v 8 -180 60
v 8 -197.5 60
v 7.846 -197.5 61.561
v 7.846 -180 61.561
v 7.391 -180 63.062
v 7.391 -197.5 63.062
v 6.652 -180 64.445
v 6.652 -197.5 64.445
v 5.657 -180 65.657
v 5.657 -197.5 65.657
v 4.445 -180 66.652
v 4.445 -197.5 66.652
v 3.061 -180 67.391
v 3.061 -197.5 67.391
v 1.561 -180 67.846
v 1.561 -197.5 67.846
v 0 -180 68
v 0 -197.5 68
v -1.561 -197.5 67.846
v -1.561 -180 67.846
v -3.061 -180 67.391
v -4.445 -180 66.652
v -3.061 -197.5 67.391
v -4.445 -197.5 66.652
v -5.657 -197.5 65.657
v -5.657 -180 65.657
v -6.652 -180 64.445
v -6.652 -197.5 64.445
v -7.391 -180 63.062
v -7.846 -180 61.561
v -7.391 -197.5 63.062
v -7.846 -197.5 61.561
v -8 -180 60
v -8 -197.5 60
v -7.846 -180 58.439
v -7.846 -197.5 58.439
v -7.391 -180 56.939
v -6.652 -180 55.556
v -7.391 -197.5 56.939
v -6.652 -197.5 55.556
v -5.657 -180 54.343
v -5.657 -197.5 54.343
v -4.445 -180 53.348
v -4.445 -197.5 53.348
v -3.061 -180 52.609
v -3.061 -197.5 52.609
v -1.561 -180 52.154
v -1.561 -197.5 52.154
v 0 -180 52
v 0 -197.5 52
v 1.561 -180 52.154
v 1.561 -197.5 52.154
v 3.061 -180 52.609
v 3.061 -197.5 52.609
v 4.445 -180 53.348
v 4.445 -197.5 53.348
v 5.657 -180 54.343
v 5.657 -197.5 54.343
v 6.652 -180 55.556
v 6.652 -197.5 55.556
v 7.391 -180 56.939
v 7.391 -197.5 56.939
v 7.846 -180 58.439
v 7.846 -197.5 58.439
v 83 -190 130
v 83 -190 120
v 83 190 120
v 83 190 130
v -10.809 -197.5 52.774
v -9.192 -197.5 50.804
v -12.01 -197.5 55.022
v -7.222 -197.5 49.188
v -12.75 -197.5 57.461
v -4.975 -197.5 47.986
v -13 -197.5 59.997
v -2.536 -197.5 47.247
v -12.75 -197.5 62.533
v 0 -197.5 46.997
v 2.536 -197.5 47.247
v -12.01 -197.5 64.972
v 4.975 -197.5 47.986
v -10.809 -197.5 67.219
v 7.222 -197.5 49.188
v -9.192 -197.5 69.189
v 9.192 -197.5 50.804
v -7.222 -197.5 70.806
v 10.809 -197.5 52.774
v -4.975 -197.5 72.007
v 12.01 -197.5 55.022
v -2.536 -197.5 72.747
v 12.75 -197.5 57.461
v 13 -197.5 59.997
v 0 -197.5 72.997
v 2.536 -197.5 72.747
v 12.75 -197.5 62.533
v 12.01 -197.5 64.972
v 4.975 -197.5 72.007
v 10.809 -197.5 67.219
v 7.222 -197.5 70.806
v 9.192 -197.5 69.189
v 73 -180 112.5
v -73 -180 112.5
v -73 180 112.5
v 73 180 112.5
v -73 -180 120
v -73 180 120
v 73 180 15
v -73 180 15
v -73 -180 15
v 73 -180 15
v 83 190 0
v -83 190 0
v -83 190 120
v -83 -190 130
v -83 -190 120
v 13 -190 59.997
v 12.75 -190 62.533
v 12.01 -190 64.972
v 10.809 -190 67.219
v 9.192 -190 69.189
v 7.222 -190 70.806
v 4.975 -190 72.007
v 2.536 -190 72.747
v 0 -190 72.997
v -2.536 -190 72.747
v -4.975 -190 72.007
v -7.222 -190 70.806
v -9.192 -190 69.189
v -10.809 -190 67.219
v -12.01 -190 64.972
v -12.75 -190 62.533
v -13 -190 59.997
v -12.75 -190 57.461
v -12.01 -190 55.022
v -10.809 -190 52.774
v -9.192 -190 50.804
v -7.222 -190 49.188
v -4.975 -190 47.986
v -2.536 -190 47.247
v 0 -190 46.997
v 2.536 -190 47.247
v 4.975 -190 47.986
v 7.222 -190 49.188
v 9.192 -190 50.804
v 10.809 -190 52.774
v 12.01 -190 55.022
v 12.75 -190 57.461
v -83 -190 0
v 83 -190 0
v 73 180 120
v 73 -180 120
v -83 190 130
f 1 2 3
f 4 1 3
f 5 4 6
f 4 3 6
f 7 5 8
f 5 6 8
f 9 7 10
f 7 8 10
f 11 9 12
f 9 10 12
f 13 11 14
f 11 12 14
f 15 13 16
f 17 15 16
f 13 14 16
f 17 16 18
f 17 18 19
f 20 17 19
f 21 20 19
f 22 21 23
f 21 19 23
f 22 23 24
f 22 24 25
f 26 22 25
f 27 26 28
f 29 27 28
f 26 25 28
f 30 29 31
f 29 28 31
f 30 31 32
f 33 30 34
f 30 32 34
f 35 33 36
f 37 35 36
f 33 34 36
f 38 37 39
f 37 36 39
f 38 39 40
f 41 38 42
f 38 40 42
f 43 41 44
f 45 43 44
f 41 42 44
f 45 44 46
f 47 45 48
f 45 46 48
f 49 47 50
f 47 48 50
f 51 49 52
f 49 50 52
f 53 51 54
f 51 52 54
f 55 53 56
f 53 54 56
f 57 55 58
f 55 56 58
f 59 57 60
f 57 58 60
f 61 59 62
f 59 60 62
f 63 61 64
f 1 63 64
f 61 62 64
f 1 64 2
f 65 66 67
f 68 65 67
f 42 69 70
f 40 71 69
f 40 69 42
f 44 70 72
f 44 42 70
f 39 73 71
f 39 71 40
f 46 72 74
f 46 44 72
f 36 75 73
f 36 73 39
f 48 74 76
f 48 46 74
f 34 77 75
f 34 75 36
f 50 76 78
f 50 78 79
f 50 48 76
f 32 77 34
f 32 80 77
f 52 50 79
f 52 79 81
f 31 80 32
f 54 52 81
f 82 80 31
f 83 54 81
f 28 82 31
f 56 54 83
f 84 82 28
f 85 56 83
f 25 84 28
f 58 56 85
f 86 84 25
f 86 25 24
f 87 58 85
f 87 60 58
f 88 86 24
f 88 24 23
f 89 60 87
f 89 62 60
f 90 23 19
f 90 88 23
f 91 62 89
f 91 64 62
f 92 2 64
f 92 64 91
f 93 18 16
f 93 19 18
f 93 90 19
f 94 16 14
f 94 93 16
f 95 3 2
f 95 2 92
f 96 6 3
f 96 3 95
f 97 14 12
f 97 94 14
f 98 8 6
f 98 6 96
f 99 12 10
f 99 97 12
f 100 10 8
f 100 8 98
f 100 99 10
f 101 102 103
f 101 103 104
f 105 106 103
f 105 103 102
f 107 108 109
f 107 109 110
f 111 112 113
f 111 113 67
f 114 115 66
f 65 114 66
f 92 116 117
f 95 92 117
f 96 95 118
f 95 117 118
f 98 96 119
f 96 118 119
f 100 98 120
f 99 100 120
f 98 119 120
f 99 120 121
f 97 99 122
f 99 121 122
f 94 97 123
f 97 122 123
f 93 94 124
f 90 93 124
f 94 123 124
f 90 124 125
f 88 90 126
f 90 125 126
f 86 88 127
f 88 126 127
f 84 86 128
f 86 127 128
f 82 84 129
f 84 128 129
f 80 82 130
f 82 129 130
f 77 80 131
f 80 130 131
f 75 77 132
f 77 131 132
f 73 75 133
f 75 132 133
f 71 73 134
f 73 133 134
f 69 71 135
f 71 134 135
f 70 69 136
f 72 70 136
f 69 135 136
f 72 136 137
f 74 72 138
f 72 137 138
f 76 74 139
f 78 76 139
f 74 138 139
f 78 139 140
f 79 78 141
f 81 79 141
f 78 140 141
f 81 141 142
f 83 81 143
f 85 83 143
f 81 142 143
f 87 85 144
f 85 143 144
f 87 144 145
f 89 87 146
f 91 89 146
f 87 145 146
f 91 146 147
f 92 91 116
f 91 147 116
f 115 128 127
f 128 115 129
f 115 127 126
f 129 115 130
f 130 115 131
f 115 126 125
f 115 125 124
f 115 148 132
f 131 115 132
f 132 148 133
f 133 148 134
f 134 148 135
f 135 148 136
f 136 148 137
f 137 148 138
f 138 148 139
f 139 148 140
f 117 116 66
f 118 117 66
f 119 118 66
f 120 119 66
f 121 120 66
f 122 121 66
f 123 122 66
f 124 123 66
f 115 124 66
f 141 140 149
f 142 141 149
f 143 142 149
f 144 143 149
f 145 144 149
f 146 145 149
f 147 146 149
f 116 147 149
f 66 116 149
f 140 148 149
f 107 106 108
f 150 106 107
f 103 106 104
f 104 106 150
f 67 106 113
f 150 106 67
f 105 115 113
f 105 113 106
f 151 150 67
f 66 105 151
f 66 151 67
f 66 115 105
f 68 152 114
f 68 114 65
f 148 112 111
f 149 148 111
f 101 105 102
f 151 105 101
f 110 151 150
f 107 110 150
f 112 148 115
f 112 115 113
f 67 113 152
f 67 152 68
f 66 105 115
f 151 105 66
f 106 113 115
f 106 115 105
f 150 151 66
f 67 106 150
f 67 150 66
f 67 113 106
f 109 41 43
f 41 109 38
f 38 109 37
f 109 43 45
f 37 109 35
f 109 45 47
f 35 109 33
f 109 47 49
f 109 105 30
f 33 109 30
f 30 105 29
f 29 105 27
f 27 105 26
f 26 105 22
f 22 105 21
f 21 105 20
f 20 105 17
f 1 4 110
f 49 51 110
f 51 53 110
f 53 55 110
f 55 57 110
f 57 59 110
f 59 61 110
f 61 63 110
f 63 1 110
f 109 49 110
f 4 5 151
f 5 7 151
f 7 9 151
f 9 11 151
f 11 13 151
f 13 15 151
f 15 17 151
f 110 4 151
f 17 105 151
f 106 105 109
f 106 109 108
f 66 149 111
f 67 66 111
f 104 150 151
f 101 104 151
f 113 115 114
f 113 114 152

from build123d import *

# Parameters (mm, degrees)
SKETCH_W        = 166
SKETCH_H        = 380
PAD_DEPTH       = 120
SKETCH001_W     = 146
SKETCH001_H     = 360
POCKET_DEPTH    = 105
SKETCH002_R     = 13
PAD001_DEPTH    = 7.5
SKETCH003_R     = 8
POCKET001_DEPTH = 17.5
SKETCH004_W     = 166
SKETCH004_H     = 380
PAD002_DEPTH    = 130
SKETCH005_W     = 166
SKETCH005_H     = 380
POCKET002_DEPTH = 120
SKETCH006_W     = 146
SKETCH006_H     = 360
PAD003_DEPTH    = 7.5


with BuildPart() as controllerbody:
    # Sketch → Pad (new body)
    with BuildSketch(Plane.XY):
        Rectangle(SKETCH_W, SKETCH_H)
    extrude(amount=PAD_DEPTH)

    # Sketch001 (on Face6 of Pad) → Pocket (cut)
    with BuildSketch(Plane.XY.offset(120)):
        Rectangle(SKETCH001_W, SKETCH001_H)
    extrude(amount=-POCKET_DEPTH, mode=Mode.SUBTRACT)

    # Sketch002 (on Face1 of Pocket) → Pad001 (join)
    with BuildSketch(Plane.XZ.offset(190)):
        with Locations((0, 59.996864)):
            Circle(SKETCH002_R)
    extrude(amount=PAD001_DEPTH)

    # Sketch003 (on Face12 of Pad001) → Pocket001 (cut)
    with BuildSketch(Plane.XZ.offset(197.5)):
        with Locations((0, 60.000145)):
            Circle(SKETCH003_R)
    extrude(amount=-POCKET001_DEPTH, mode=Mode.SUBTRACT)


with BuildPart() as controllerlid:
    # Sketch004 → Pad002 (new body)
    with BuildSketch(Plane.XY):
        Rectangle(SKETCH004_W, SKETCH004_H)
    extrude(amount=PAD002_DEPTH)

    # Sketch005 (on Face5 of Pad002) → Pocket002 (cut)
    with BuildSketch(Plane(origin=(0, 0, 0), x_dir=(1, 0, 0), z_dir=(0, 0, -1))):
        Rectangle(SKETCH005_W, SKETCH005_H)
    extrude(amount=-POCKET002_DEPTH, mode=Mode.SUBTRACT)

    # Sketch006 (on Face2 of Pocket002) → Pad003 (join)
    with BuildSketch(Plane(origin=(0, 0, 120), x_dir=(1, 0, 0), z_dir=(0, 0, -1))):
        Rectangle(SKETCH006_W, SKETCH006_H)
    extrude(amount=PAD003_DEPTH)


solid = Compound([controllerbody.part, controllerlid.part])
